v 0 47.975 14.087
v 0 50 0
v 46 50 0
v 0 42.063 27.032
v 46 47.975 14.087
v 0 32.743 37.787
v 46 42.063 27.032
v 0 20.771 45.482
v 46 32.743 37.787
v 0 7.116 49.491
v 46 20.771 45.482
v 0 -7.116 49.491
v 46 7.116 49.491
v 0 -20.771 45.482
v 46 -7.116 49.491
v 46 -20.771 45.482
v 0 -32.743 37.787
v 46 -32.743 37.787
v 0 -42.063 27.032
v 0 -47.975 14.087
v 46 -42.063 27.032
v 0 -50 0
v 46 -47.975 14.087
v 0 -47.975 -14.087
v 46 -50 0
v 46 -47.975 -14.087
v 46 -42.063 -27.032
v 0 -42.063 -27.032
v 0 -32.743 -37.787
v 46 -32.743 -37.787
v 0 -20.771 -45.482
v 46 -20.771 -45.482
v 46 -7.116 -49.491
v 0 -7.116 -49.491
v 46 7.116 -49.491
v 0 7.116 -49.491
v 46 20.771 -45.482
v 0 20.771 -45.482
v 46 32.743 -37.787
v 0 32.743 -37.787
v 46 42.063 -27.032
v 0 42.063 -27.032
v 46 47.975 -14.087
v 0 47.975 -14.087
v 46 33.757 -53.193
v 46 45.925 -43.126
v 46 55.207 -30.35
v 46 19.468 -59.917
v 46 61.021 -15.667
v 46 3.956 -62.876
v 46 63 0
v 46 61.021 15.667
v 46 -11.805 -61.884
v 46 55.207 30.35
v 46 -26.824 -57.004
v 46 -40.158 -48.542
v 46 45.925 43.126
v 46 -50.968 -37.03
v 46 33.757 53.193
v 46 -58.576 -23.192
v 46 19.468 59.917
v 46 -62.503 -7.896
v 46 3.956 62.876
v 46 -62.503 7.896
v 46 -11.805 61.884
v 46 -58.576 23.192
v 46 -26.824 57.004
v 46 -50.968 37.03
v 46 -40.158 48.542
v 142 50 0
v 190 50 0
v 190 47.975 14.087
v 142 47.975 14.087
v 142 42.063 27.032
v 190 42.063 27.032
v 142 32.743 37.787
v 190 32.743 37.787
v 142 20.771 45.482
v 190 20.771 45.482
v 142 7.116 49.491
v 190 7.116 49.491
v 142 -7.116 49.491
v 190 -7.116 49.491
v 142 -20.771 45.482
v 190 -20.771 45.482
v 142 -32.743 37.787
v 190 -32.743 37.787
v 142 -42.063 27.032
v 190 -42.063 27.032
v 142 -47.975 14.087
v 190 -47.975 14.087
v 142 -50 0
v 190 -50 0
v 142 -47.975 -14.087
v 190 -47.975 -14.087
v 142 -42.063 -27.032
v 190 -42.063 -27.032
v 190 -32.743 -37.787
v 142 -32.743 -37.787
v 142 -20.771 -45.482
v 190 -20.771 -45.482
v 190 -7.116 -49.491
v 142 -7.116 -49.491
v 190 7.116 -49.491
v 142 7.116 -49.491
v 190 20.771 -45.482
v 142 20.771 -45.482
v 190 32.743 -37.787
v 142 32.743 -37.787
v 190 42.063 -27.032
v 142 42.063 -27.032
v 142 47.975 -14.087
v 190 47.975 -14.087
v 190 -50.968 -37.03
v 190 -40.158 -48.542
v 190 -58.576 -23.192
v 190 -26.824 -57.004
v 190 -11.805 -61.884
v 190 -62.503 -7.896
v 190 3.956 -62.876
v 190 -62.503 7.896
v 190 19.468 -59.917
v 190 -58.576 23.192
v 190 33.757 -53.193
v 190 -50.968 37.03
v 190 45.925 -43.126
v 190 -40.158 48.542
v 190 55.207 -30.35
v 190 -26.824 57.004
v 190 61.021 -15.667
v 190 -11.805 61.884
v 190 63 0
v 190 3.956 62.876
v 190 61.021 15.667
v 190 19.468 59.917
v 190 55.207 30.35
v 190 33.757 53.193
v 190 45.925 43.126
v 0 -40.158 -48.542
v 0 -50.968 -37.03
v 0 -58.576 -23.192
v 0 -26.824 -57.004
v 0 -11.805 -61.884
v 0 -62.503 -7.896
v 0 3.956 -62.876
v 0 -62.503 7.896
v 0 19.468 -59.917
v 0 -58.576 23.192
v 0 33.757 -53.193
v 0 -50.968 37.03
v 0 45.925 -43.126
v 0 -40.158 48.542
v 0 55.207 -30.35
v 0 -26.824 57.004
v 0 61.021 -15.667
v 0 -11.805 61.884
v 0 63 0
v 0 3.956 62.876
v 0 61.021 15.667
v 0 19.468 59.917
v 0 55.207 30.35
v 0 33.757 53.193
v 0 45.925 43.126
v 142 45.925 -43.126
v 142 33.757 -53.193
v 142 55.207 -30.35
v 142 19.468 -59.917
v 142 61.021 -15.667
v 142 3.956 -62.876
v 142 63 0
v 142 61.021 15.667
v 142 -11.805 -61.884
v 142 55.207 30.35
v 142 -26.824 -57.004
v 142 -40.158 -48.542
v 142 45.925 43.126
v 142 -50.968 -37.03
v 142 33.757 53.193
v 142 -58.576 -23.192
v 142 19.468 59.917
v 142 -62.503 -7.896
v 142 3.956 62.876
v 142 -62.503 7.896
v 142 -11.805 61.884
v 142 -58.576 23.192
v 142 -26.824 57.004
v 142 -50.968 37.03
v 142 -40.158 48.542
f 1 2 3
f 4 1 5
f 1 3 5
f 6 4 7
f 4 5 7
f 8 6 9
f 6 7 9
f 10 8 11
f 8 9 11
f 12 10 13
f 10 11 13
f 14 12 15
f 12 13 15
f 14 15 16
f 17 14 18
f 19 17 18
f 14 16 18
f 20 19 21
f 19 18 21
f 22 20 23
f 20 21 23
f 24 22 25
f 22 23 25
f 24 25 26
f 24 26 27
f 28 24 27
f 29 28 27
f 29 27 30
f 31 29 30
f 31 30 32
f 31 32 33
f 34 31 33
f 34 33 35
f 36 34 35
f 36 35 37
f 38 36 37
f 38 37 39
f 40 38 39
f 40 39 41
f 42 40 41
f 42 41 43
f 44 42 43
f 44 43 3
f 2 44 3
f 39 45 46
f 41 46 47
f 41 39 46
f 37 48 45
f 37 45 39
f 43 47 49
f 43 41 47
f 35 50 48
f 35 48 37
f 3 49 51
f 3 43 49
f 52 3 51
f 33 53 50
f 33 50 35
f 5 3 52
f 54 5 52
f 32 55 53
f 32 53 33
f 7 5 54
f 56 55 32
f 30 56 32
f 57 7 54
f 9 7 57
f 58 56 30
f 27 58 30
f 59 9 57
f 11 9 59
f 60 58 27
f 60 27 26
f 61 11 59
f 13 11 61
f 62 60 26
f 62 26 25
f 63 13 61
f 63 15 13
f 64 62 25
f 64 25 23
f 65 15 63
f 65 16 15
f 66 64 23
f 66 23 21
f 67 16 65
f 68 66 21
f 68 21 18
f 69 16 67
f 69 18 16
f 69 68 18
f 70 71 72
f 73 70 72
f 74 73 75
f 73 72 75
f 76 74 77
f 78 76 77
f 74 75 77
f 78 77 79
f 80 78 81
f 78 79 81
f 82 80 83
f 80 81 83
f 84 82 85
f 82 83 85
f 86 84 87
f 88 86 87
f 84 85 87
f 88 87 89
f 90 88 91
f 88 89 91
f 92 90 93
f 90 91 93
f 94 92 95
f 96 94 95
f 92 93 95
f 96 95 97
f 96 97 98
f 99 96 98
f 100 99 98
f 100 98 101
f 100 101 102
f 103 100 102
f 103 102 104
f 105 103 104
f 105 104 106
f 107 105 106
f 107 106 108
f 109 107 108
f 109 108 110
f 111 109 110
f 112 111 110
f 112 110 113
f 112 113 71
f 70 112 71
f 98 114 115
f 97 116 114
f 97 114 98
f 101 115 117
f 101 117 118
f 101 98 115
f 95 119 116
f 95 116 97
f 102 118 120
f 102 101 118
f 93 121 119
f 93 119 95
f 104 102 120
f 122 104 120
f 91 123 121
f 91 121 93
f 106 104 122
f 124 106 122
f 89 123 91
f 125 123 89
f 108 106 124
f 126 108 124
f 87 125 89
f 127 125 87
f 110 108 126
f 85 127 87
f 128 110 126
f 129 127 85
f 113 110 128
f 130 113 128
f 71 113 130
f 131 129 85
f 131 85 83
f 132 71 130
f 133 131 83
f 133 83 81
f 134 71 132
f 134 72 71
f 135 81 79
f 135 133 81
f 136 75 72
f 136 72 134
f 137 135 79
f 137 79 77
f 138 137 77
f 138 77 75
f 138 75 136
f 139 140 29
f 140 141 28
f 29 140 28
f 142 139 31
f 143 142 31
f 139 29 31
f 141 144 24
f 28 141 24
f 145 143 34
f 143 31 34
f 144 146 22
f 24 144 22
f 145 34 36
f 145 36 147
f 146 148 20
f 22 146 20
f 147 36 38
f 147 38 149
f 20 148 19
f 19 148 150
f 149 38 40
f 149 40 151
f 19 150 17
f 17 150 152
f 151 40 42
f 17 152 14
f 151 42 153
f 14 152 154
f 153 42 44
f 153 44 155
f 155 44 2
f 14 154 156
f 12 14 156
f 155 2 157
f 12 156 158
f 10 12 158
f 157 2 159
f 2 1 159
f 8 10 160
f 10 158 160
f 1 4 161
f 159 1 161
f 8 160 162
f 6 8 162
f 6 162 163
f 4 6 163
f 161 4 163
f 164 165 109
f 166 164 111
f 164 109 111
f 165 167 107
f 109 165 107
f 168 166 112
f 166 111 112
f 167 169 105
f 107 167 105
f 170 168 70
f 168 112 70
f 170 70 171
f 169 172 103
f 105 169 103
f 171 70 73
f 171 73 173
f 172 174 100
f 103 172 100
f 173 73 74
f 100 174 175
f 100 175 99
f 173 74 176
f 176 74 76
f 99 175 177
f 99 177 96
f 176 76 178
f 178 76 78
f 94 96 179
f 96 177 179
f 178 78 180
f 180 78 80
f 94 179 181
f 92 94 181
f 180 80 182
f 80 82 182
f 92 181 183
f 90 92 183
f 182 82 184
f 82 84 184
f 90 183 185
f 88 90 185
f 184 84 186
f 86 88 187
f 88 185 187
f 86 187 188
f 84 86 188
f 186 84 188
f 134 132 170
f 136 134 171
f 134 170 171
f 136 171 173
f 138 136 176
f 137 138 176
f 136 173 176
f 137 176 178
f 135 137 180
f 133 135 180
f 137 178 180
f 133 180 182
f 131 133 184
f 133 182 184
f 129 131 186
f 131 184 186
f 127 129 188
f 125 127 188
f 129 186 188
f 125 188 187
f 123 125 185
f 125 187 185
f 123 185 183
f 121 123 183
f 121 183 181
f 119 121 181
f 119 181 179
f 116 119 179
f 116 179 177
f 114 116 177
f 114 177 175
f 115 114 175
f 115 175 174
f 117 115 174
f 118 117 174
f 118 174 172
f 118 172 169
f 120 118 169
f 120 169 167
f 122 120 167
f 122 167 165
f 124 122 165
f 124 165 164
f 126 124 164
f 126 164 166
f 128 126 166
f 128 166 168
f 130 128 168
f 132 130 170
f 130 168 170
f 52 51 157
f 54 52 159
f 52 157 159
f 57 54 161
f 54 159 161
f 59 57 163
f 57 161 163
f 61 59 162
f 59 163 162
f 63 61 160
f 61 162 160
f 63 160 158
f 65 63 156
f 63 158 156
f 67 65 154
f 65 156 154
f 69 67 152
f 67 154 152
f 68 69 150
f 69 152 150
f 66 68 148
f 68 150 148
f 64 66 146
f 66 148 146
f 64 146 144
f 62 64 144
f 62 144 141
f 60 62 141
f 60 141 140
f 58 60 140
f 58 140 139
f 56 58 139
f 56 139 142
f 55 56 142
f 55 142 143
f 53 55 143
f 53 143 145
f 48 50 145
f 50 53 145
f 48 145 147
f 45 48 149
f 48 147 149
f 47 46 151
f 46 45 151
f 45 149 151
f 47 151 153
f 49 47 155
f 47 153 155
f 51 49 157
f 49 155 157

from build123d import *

# Parameters (mm, degrees)
F0_R          = 63
F1_DEPTH      = 190
F2_R          = 50
F3_DEPTH      = 190
F4_W          = 96
F4_H          = 126
F5_DEPTH      = 70
F5_DEPTH_BACK = 70


with BuildPart() as f1:
    # F0 (on Right) → F1 (new body)
    with BuildSketch(Plane.YZ):
        Circle(F0_R)
    extrude(amount=F1_DEPTH)

    # F2 (on face) → F3 (cut)
    with BuildSketch(Plane.YZ.offset(190)):
        Circle(F2_R)
    extrude(amount=-F3_DEPTH, mode=Mode.SUBTRACT)

    # F4 (on Front) → F5 (cut, two sides)
    with BuildSketch(Plane.XZ) as f5_sk:
        with Locations((94, 0)):
            Rectangle(F4_W, F4_H)
    extrude(amount=-F5_DEPTH, mode=Mode.SUBTRACT)
    extrude(f5_sk.sketch, amount=F5_DEPTH_BACK, mode=Mode.SUBTRACT)


solid = f1.part
